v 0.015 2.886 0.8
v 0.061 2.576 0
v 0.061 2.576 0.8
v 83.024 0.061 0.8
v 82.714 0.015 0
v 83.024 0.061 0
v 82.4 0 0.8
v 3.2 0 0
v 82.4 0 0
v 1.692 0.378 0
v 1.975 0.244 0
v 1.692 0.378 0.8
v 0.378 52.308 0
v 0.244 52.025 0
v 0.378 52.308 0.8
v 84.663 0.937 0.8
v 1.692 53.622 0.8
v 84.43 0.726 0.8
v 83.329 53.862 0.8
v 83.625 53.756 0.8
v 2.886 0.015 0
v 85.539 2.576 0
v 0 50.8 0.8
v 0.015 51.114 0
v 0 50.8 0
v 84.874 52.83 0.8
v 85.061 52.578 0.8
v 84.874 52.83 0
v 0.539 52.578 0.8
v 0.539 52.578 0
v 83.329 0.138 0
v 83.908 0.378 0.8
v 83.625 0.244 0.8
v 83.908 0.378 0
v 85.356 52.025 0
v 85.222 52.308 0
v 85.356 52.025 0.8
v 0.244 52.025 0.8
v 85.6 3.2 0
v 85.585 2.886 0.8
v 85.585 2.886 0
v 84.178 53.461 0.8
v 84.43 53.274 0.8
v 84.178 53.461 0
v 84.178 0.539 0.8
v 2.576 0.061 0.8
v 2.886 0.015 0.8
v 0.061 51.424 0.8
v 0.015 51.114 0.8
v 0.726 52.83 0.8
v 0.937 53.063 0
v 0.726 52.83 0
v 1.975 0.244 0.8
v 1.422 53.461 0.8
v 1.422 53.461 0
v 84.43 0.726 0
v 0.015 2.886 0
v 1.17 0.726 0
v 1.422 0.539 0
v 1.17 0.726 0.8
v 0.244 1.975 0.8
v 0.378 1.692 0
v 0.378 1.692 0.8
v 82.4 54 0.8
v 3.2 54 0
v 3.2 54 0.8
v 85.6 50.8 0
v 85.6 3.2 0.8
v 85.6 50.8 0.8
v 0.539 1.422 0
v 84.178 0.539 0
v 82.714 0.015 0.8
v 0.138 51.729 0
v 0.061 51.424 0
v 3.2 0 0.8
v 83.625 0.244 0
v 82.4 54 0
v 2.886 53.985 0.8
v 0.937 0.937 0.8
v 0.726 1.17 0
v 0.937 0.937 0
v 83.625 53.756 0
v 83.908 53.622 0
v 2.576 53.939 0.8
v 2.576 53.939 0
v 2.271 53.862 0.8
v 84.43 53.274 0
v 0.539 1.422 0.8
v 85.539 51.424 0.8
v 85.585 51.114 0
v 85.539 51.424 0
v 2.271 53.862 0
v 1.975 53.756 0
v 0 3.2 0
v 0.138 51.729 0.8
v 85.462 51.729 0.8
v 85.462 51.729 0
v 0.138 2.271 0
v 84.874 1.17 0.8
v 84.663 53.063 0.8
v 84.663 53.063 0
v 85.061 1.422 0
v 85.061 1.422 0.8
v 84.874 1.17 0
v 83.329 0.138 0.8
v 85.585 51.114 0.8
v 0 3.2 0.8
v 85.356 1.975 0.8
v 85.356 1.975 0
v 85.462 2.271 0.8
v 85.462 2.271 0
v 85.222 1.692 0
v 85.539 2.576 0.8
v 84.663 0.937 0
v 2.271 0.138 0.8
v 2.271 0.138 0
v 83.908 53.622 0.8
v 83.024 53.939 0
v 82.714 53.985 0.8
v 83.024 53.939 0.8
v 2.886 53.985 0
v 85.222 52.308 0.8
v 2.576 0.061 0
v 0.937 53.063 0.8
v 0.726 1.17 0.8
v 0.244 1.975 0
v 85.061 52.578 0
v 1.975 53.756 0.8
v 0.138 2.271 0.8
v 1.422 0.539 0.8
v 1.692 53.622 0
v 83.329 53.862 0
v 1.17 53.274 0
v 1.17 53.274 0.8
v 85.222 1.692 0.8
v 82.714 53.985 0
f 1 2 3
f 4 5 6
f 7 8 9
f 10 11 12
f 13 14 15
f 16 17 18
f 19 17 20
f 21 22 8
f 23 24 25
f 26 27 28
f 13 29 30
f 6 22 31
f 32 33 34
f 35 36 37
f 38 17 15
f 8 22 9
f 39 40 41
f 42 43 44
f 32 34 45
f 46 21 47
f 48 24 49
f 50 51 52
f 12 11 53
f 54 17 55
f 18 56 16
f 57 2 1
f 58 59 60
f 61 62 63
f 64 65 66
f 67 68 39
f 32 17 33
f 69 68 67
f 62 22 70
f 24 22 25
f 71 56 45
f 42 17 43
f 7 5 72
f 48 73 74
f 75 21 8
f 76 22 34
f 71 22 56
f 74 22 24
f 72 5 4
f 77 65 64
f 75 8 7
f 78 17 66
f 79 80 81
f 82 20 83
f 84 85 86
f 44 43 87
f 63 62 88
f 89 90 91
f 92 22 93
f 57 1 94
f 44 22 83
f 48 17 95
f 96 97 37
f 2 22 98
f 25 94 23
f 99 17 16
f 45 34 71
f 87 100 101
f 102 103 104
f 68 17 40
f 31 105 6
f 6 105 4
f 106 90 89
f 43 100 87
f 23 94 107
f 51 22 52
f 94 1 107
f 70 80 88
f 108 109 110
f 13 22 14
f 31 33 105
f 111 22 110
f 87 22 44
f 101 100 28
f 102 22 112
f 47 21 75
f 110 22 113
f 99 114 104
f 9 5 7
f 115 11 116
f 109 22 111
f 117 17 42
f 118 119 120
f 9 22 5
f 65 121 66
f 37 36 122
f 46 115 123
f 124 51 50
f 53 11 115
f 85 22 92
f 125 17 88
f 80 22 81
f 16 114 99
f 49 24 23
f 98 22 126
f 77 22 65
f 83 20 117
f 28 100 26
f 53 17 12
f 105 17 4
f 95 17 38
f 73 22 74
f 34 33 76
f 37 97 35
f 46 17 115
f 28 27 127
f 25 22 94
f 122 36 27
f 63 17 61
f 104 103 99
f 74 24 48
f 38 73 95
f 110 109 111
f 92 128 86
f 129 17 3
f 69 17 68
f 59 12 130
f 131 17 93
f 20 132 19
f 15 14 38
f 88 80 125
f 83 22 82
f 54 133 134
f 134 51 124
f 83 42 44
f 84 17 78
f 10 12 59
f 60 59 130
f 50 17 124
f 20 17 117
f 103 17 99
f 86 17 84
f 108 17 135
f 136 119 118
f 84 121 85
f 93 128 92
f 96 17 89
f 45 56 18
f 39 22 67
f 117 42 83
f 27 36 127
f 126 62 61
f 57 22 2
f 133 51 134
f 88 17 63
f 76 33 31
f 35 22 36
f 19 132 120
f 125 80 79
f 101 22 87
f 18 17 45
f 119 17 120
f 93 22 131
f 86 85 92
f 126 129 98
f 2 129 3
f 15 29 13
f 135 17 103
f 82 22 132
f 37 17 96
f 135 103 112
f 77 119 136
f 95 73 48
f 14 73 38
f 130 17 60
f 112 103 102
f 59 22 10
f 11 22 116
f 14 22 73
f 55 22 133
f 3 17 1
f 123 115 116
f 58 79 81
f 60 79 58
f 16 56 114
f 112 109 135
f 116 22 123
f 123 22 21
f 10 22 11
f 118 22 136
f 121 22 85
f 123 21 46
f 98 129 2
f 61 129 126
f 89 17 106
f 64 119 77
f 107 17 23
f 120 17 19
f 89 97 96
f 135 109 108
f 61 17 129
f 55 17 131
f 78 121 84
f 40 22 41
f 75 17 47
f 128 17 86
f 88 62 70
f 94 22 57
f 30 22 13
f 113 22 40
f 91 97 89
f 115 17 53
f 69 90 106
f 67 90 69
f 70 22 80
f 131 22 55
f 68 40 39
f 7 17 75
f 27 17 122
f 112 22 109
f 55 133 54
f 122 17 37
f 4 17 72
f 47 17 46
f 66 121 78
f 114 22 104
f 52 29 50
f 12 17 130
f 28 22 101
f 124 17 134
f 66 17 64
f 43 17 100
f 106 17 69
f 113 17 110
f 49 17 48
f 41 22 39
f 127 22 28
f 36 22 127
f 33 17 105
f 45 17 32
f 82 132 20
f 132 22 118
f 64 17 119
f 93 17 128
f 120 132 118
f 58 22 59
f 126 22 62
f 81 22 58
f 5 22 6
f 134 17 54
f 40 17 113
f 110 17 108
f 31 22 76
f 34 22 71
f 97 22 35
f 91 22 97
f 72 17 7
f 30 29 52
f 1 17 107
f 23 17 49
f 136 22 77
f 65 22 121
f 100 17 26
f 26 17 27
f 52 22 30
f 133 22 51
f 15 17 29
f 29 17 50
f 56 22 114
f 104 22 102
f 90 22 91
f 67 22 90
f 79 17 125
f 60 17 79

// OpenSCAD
// ═══════════════════════════════════════════════════════════════════
// ZaZet Solutions — 3D Printed Business Card  v3
// ═══════════════════════════════════════════════════════════════════
//
//  Standard ISO 7810 ID-1: 85.6 × 54 mm  |  Total: 1.6 mm thick
//
//  THREE COLORS — AMS / multi-material:
//    COLOR 1  Navy blue  — card base  (z 0 → 0.8 mm)
//    COLOR 2  Gold       — all raised text + logo bottom 70% + QR code
//    COLOR 3  Blue       — logo "ZaZet" top 30%
//
//  QR code links to: https://zazet-solutions.hr
//  Bottom-right corner, 18×18 mm (25×25 modules @ 0.72 mm each)
// ═══════════════════════════════════════════════════════════════════

COLOR = 1; // ← 1=navy  2=gold  3=blue

CARD_W = 85.6;
CARD_H = 54.0;
T      = 0.8;
CR     = 3.2;
e      = 0.01;

FB  = "Liberation Sans:style=Bold";
FR  = "Liberation Sans:style=Regular";
FI  = "Liberation Sans:style=Italic";

NAME    = "Gal Tidhar";
TITLE1  = "Software Engineer";
TITLE2  = "& Builder";
TAGLINE = "Less chaos. More business.";
PHONE   = "+385 99 190 4995";
EMAIL   = "gal@zazet-solutions.hr";
WEB     = "zazet-solutions.hr";
LI      = "linkedin.com/in/galtidhar";

LX      = 6.5;
LY      = 33.5;
LSIZE   = 11;
LCAP    = LSIZE * 0.72;
LSPLIT  = LY + LCAP * 0.70;   // ≈ 39.1 — y where gold ends / blue starts

// QR code position (bottom-right)
QR_X    = 59.0;   // left edge of QR
QR_Y    = 4.5;    // bottom edge of QR
QR_H    = T;      // same height as all raised elements

// ─────────────────────────────────────────────────────────────────
module card_outline(h) {
    hull()
        for (x = [CR, CARD_W-CR], y = [CR, CARD_H-CR])
            translate([x, y, 0])
                cylinder(r=CR, h=h, $fn=64);
}

module zazet_gold() {
    intersection() {
        translate([LX, LY, 0])
            linear_extrude(T + e)
                text("ZaZet", size=LSIZE, font=FB,
                     halign="left", valign="bottom");
        cube([CARD_W, LSPLIT, T + 2*e]);
    }
}

module zazet_blue() {
    intersection() {
        translate([LX, LY, 0])
            linear_extrude(T + e)
                text("ZaZet", size=LSIZE, font=FB,
                     halign="left", valign="bottom");
        translate([0, LSPLIT, -e])
            cube([CARD_W, CARD_H, T + 2*e]);
    }
}

module gold_text() {
    // "SOLUTIONS" subtitle
    translate([LX, 28.2, 0])
        linear_extrude(T * 0.7)
            text("SOLUTIONS", size=3.0, font=FB, spacing=1.35,
                 halign="left", valign="bottom");

    // Vertical rule — logo | name
    translate([43.5, 26.5, 0]) cube([0.55, 23.5, T * 0.65]);

    // Name
    translate([46.5, 44.0, 0])
        linear_extrude(T)
            text(NAME, size=5.0, font=FB, halign="left", valign="center");

    // Title
    translate([46.5, 38.0, 0])
        linear_extrude(T)
            text(TITLE1, size=2.5, font=FR, halign="left", valign="center");
    translate([46.5, 34.5, 0])
        linear_extrude(T)
            text(TITLE2, size=2.5, font=FR, halign="left", valign="center");

    // Main horizontal rule
    translate([6.5, 25.5, 0]) cube([CARD_W - 13, 0.5, T * 0.55]);

    // Tagline — left-aligned below rule, italic
    translate([6.5, 21.5, 0])
        linear_extrude(T * 0.75)
            text(TAGLINE, size=2.8, font=FI, halign="left", valign="center");

    // Thin rule between tagline and contact
    translate([6.5, 18.2, 0]) cube([47.5, 0.32, T * 0.45]);

    // Contact info (left column, 4 lines)
    translate([6.5, 15.5, 0]) linear_extrude(T * 0.7)
        text(PHONE, size=2.2, font=FR, halign="left", valign="center");
    translate([6.5, 11.5, 0]) linear_extrude(T * 0.7)
        text(EMAIL, size=2.2, font=FR, halign="left", valign="center");
    translate([6.5,  7.5, 0]) linear_extrude(T * 0.7)
        text(WEB,   size=2.2, font=FR, halign="left", valign="center");
    translate([6.5,  3.5, 0]) linear_extrude(T * 0.7)
        text(LI,    size=2.2, font=FR, halign="left", valign="center");

    // Vertical rule — contact | QR
    translate([56.0, 4.0, 0]) cube([0.45, 21.0, T * 0.55]);

    // QR code — bottom right corner
    qr_code(QR_X, QR_Y, QR_H);
}

// ─────────────────────────────────────────────────────────────────
// Auto-generated QR code — https://zazet-solutions.hr
// Version 2, 25×25 modules, 0.72mm per module
module qr_code(x0, y0, h, e=0.01) {
  translate([x0, y0, 0]) {
  translate([0.0000,17.2800,0]) cube([0.72,0.72,h+e]);
  translate([0.7200,17.2800,0]) cube([0.72,0.72,h+e]);
  translate([1.4400,17.2800,0]) cube([0.72,0.72,h+e]);
  translate([2.1600,17.2800,0]) cube([0.72,0.72,h+e]);
  translate([2.8800,17.2800,0]) cube([0.72,0.72,h+e]);
  translate([3.6000,17.2800,0]) cube([0.72,0.72,h+e]);
  translate([4.3200,17.2800,0]) cube([0.72,0.72,h+e]);
  translate([5.7600,17.2800,0]) cube([0.72,0.72,h+e]);
  translate([6.4800,17.2800,0]) cube([0.72,0.72,h+e]);
  translate([7.2000,17.2800,0]) cube([0.72,0.72,h+e]);
  translate([7.9200,17.2800,0]) cube([0.72,0.72,h+e]);
  translate([9.3600,17.2800,0]) cube([0.72,0.72,h+e]);
  translate([12.9600,17.2800,0]) cube([0.72,0.72,h+e]);
  translate([13.6800,17.2800,0]) cube([0.72,0.72,h+e]);
  translate([14.4000,17.2800,0]) cube([0.72,0.72,h+e]);
  translate([15.1200,17.2800,0]) cube([0.72,0.72,h+e]);
  translate([15.8400,17.2800,0]) cube([0.72,0.72,h+e]);
  translate([16.5600,17.2800,0]) cube([0.72,0.72,h+e]);
  translate([17.2800,17.2800,0]) cube([0.72,0.72,h+e]);
  translate([0.0000,16.5600,0]) cube([0.72,0.72,h+e]);
  translate([4.3200,16.5600,0]) cube([0.72,0.72,h+e]);
  translate([5.7600,16.5600,0]) cube([0.72,0.72,h+e]);
  translate([6.4800,16.5600,0]) cube([0.72,0.72,h+e]);
  translate([8.6400,16.5600,0]) cube([0.72,0.72,h+e]);
  translate([9.3600,16.5600,0]) cube([0.72,0.72,h+e]);
  translate([12.9600,16.5600,0]) cube([0.72,0.72,h+e]);
  translate([17.2800,16.5600,0]) cube([0.72,0.72,h+e]);
  translate([0.0000,15.8400,0]) cube([0.72,0.72,h+e]);
  translate([1.4400,15.8400,0]) cube([0.72,0.72,h+e]);
  translate([2.1600,15.8400,0]) cube([0.72,0.72,h+e]);
  translate([2.8800,15.8400,0]) cube([0.72,0.72,h+e]);
  translate([4.3200,15.8400,0]) cube([0.72,0.72,h+e]);
  translate([5.7600,15.8400,0]) cube([0.72,0.72,h+e]);
  translate([7.2000,15.8400,0]) cube([0.72,0.72,h+e]);
  translate([7.9200,15.8400,0]) cube([0.72,0.72,h+e]);
  translate([9.3600,15.8400,0]) cube([0.72,0.72,h+e]);
  translate([10.0800,15.8400,0]) cube([0.72,0.72,h+e]);
  translate([10.8000,15.8400,0]) cube([0.72,0.72,h+e]);
  translate([12.9600,15.8400,0]) cube([0.72,0.72,h+e]);
  translate([14.4000,15.8400,0]) cube([0.72,0.72,h+e]);
  translate([15.1200,15.8400,0]) cube([0.72,0.72,h+e]);
  translate([15.8400,15.8400,0]) cube([0.72,0.72,h+e]);
  translate([17.2800,15.8400,0]) cube([0.72,0.72,h+e]);
  translate([0.0000,15.1200,0]) cube([0.72,0.72,h+e]);
  translate([1.4400,15.1200,0]) cube([0.72,0.72,h+e]);
  translate([2.1600,15.1200,0]) cube([0.72,0.72,h+e]);
  translate([2.8800,15.1200,0]) cube([0.72,0.72,h+e]);
  translate([4.3200,15.1200,0]) cube([0.72,0.72,h+e]);
  translate([6.4800,15.1200,0]) cube([0.72,0.72,h+e]);
  translate([9.3600,15.1200,0]) cube([0.72,0.72,h+e]);
  translate([10.8000,15.1200,0]) cube([0.72,0.72,h+e]);
  translate([11.5200,15.1200,0]) cube([0.72,0.72,h+e]);
  translate([12.9600,15.1200,0]) cube([0.72,0.72,h+e]);
  translate([14.4000,15.1200,0]) cube([0.72,0.72,h+e]);
  translate([15.1200,15.1200,0]) cube([0.72,0.72,h+e]);
  translate([15.8400,15.1200,0]) cube([0.72,0.72,h+e]);
  translate([17.2800,15.1200,0]) cube([0.72,0.72,h+e]);
  translate([0.0000,14.4000,0]) cube([0.72,0.72,h+e]);
  translate([1.4400,14.4000,0]) cube([0.72,0.72,h+e]);
  translate([2.1600,14.4000,0]) cube([0.72,0.72,h+e]);
  translate([2.8800,14.4000,0]) cube([0.72,0.72,h+e]);
  translate([4.3200,14.4000,0]) cube([0.72,0.72,h+e]);
  translate([5.7600,14.4000,0]) cube([0.72,0.72,h+e]);
  translate([8.6400,14.4000,0]) cube([0.72,0.72,h+e]);
  translate([11.5200,14.4000,0]) cube([0.72,0.72,h+e]);
  translate([12.9600,14.4000,0]) cube([0.72,0.72,h+e]);
  translate([14.4000,14.4000,0]) cube([0.72,0.72,h+e]);
  translate([15.1200,14.4000,0]) cube([0.72,0.72,h+e]);
  translate([15.8400,14.4000,0]) cube([0.72,0.72,h+e]);
  translate([17.2800,14.4000,0]) cube([0.72,0.72,h+e]);
  translate([0.0000,13.6800,0]) cube([0.72,0.72,h+e]);
  translate([4.3200,13.6800,0]) cube([0.72,0.72,h+e]);
  translate([7.9200,13.6800,0]) cube([0.72,0.72,h+e]);
  translate([8.6400,13.6800,0]) cube([0.72,0.72,h+e]);
  translate([10.0800,13.6800,0]) cube([0.72,0.72,h+e]);
  translate([12.9600,13.6800,0]) cube([0.72,0.72,h+e]);
  translate([17.2800,13.6800,0]) cube([0.72,0.72,h+e]);
  translate([0.0000,12.9600,0]) cube([0.72,0.72,h+e]);
  translate([0.7200,12.9600,0]) cube([0.72,0.72,h+e]);
  translate([1.4400,12.9600,0]) cube([0.72,0.72,h+e]);
  translate([2.1600,12.9600,0]) cube([0.72,0.72,h+e]);
  translate([2.8800,12.9600,0]) cube([0.72,0.72,h+e]);
  translate([3.6000,12.9600,0]) cube([0.72,0.72,h+e]);
  translate([4.3200,12.9600,0]) cube([0.72,0.72,h+e]);
  translate([5.7600,12.9600,0]) cube([0.72,0.72,h+e]);
  translate([7.2000,12.9600,0]) cube([0.72,0.72,h+e]);
  translate([8.6400,12.9600,0]) cube([0.72,0.72,h+e]);
  translate([10.0800,12.9600,0]) cube([0.72,0.72,h+e]);
  translate([11.5200,12.9600,0]) cube([0.72,0.72,h+e]);
  translate([12.9600,12.9600,0]) cube([0.72,0.72,h+e]);
  translate([13.6800,12.9600,0]) cube([0.72,0.72,h+e]);
  translate([14.4000,12.9600,0]) cube([0.72,0.72,h+e]);
  translate([15.1200,12.9600,0]) cube([0.72,0.72,h+e]);
  translate([15.8400,12.9600,0]) cube([0.72,0.72,h+e]);
  translate([16.5600,12.9600,0]) cube([0.72,0.72,h+e]);
  translate([17.2800,12.9600,0]) cube([0.72,0.72,h+e]);
  translate([7.2000,12.2400,0]) cube([0.72,0.72,h+e]);
  translate([7.9200,12.2400,0]) cube([0.72,0.72,h+e]);
  translate([9.3600,12.2400,0]) cube([0.72,0.72,h+e]);
  translate([10.0800,12.2400,0]) cube([0.72,0.72,h+e]);
  translate([10.8000,12.2400,0]) cube([0.72,0.72,h+e]);
  translate([11.5200,12.2400,0]) cube([0.72,0.72,h+e]);
  translate([0.0000,11.5200,0]) cube([0.72,0.72,h+e]);
  translate([2.1600,11.5200,0]) cube([0.72,0.72,h+e]);
  translate([2.8800,11.5200,0]) cube([0.72,0.72,h+e]);
  translate([3.6000,11.5200,0]) cube([0.72,0.72,h+e]);
  translate([4.3200,11.5200,0]) cube([0.72,0.72,h+e]);
  translate([5.0400,11.5200,0]) cube([0.72,0.72,h+e]);
  translate([5.7600,11.5200,0]) cube([0.72,0.72,h+e]);
  translate([6.4800,11.5200,0]) cube([0.72,0.72,h+e]);
  translate([7.2000,11.5200,0]) cube([0.72,0.72,h+e]);
  translate([10.0800,11.5200,0]) cube([0.72,0.72,h+e]);
  translate([11.5200,11.5200,0]) cube([0.72,0.72,h+e]);
  translate([12.2400,11.5200,0]) cube([0.72,0.72,h+e]);
  translate([14.4000,11.5200,0]) cube([0.72,0.72,h+e]);
  translate([15.8400,11.5200,0]) cube([0.72,0.72,h+e]);
  translate([16.5600,11.5200,0]) cube([0.72,0.72,h+e]);
  translate([17.2800,11.5200,0]) cube([0.72,0.72,h+e]);
  translate([0.0000,10.8000,0]) cube([0.72,0.72,h+e]);
  translate([1.4400,10.8000,0]) cube([0.72,0.72,h+e]);
  translate([5.0400,10.8000,0]) cube([0.72,0.72,h+e]);
  translate([5.7600,10.8000,0]) cube([0.72,0.72,h+e]);
  translate([7.2000,10.8000,0]) cube([0.72,0.72,h+e]);
  translate([8.6400,10.8000,0]) cube([0.72,0.72,h+e]);
  translate([9.3600,10.8000,0]) cube([0.72,0.72,h+e]);
  translate([10.0800,10.8000,0]) cube([0.72,0.72,h+e]);
  translate([10.8000,10.8000,0]) cube([0.72,0.72,h+e]);
  translate([13.6800,10.8000,0]) cube([0.72,0.72,h+e]);
  translate([14.4000,10.8000,0]) cube([0.72,0.72,h+e]);
  translate([15.1200,10.8000,0]) cube([0.72,0.72,h+e]);
  translate([15.8400,10.8000,0]) cube([0.72,0.72,h+e]);
  translate([16.5600,10.8000,0]) cube([0.72,0.72,h+e]);
  translate([0.7200,10.0800,0]) cube([0.72,0.72,h+e]);
  translate([1.4400,10.0800,0]) cube([0.72,0.72,h+e]);
  translate([2.8800,10.0800,0]) cube([0.72,0.72,h+e]);
  translate([3.6000,10.0800,0]) cube([0.72,0.72,h+e]);
  translate([4.3200,10.0800,0]) cube([0.72,0.72,h+e]);
  translate([5.0400,10.0800,0]) cube([0.72,0.72,h+e]);
  translate([5.7600,10.0800,0]) cube([0.72,0.72,h+e]);
  translate([6.4800,10.0800,0]) cube([0.72,0.72,h+e]);
  translate([7.2000,10.0800,0]) cube([0.72,0.72,h+e]);
  translate([7.9200,10.0800,0]) cube([0.72,0.72,h+e]);
  translate([8.6400,10.0800,0]) cube([0.72,0.72,h+e]);
  translate([10.0800,10.0800,0]) cube([0.72,0.72,h+e]);
  translate([10.8000,10.0800,0]) cube([0.72,0.72,h+e]);
  translate([11.5200,10.0800,0]) cube([0.72,0.72,h+e]);
  translate([12.2400,10.0800,0]) cube([0.72,0.72,h+e]);
  translate([12.9600,10.0800,0]) cube([0.72,0.72,h+e]);
  translate([15.1200,10.0800,0]) cube([0.72,0.72,h+e]);
  translate([17.2800,10.0800,0]) cube([0.72,0.72,h+e]);
  translate([3.6000,9.3600,0]) cube([0.72,0.72,h+e]);
  translate([5.0400,9.3600,0]) cube([0.72,0.72,h+e]);
  translate([5.7600,9.3600,0]) cube([0.72,0.72,h+e]);
  translate([6.4800,9.3600,0]) cube([0.72,0.72,h+e]);
  translate([8.6400,9.3600,0]) cube([0.72,0.72,h+e]);
  translate([10.0800,9.3600,0]) cube([0.72,0.72,h+e]);
  translate([10.8000,9.3600,0]) cube([0.72,0.72,h+e]);
  translate([11.5200,9.3600,0]) cube([0.72,0.72,h+e]);
  translate([12.9600,9.3600,0]) cube([0.72,0.72,h+e]);
  translate([14.4000,9.3600,0]) cube([0.72,0.72,h+e]);
  translate([15.1200,9.3600,0]) cube([0.72,0.72,h+e]);
  translate([15.8400,9.3600,0]) cube([0.72,0.72,h+e]);
  translate([16.5600,9.3600,0]) cube([0.72,0.72,h+e]);
  translate([17.2800,9.3600,0]) cube([0.72,0.72,h+e]);
  translate([2.8800,8.6400,0]) cube([0.72,0.72,h+e]);
  translate([3.6000,8.6400,0]) cube([0.72,0.72,h+e]);
  translate([4.3200,8.6400,0]) cube([0.72,0.72,h+e]);
  translate([5.0400,8.6400,0]) cube([0.72,0.72,h+e]);
  translate([7.2000,8.6400,0]) cube([0.72,0.72,h+e]);
  translate([7.9200,8.6400,0]) cube([0.72,0.72,h+e]);
  translate([8.6400,8.6400,0]) cube([0.72,0.72,h+e]);
  translate([10.8000,8.6400,0]) cube([0.72,0.72,h+e]);
  translate([12.9600,8.6400,0]) cube([0.72,0.72,h+e]);
  translate([17.2800,8.6400,0]) cube([0.72,0.72,h+e]);
  translate([0.0000,7.9200,0]) cube([0.72,0.72,h+e]);
  translate([1.4400,7.9200,0]) cube([0.72,0.72,h+e]);
  translate([2.8800,7.9200,0]) cube([0.72,0.72,h+e]);
  translate([3.6000,7.9200,0]) cube([0.72,0.72,h+e]);
  translate([8.6400,7.9200,0]) cube([0.72,0.72,h+e]);
  translate([10.0800,7.9200,0]) cube([0.72,0.72,h+e]);
  translate([10.8000,7.9200,0]) cube([0.72,0.72,h+e]);
  translate([11.5200,7.9200,0]) cube([0.72,0.72,h+e]);
  translate([12.2400,7.9200,0]) cube([0.72,0.72,h+e]);
  translate([14.4000,7.9200,0]) cube([0.72,0.72,h+e]);
  translate([16.5600,7.9200,0]) cube([0.72,0.72,h+e]);
  translate([0.0000,7.2000,0]) cube([0.72,0.72,h+e]);
  translate([0.7200,7.2000,0]) cube([0.72,0.72,h+e]);
  translate([4.3200,7.2000,0]) cube([0.72,0.72,h+e]);
  translate([5.7600,7.2000,0]) cube([0.72,0.72,h+e]);
  translate([8.6400,7.2000,0]) cube([0.72,0.72,h+e]);
  translate([10.0800,7.2000,0]) cube([0.72,0.72,h+e]);
  translate([10.8000,7.2000,0]) cube([0.72,0.72,h+e]);
  translate([14.4000,7.2000,0]) cube([0.72,0.72,h+e]);
  translate([15.1200,7.2000,0]) cube([0.72,0.72,h+e]);
  translate([15.8400,7.2000,0]) cube([0.72,0.72,h+e]);
  translate([16.5600,7.2000,0]) cube([0.72,0.72,h+e]);
  translate([17.2800,7.2000,0]) cube([0.72,0.72,h+e]);
  translate([0.0000,6.4800,0]) cube([0.72,0.72,h+e]);
  translate([1.4400,6.4800,0]) cube([0.72,0.72,h+e]);
  translate([2.1600,6.4800,0]) cube([0.72,0.72,h+e]);
  translate([3.6000,6.4800,0]) cube([0.72,0.72,h+e]);
  translate([5.0400,6.4800,0]) cube([0.72,0.72,h+e]);
  translate([6.4800,6.4800,0]) cube([0.72,0.72,h+e]);
  translate([7.2000,6.4800,0]) cube([0.72,0.72,h+e]);
  translate([7.9200,6.4800,0]) cube([0.72,0.72,h+e]);
  translate([8.6400,6.4800,0]) cube([0.72,0.72,h+e]);
  translate([13.6800,6.4800,0]) cube([0.72,0.72,h+e]);
  translate([15.1200,6.4800,0]) cube([0.72,0.72,h+e]);
  translate([15.8400,6.4800,0]) cube([0.72,0.72,h+e]);
  translate([17.2800,6.4800,0]) cube([0.72,0.72,h+e]);
  translate([0.0000,5.7600,0]) cube([0.72,0.72,h+e]);
  translate([1.4400,5.7600,0]) cube([0.72,0.72,h+e]);
  translate([2.1600,5.7600,0]) cube([0.72,0.72,h+e]);
  translate([2.8800,5.7600,0]) cube([0.72,0.72,h+e]);
  translate([4.3200,5.7600,0]) cube([0.72,0.72,h+e]);
  translate([5.7600,5.7600,0]) cube([0.72,0.72,h+e]);
  translate([7.2000,5.7600,0]) cube([0.72,0.72,h+e]);
  translate([7.9200,5.7600,0]) cube([0.72,0.72,h+e]);
  translate([9.3600,5.7600,0]) cube([0.72,0.72,h+e]);
  translate([11.5200,5.7600,0]) cube([0.72,0.72,h+e]);
  translate([12.2400,5.7600,0]) cube([0.72,0.72,h+e]);
  translate([12.9600,5.7600,0]) cube([0.72,0.72,h+e]);
  translate([13.6800,5.7600,0]) cube([0.72,0.72,h+e]);
  translate([14.4000,5.7600,0]) cube([0.72,0.72,h+e]);
  translate([15.8400,5.7600,0]) cube([0.72,0.72,h+e]);
  translate([16.5600,5.7600,0]) cube([0.72,0.72,h+e]);
  translate([5.7600,5.0400,0]) cube([0.72,0.72,h+e]);
  translate([7.2000,5.0400,0]) cube([0.72,0.72,h+e]);
  translate([9.3600,5.0400,0]) cube([0.72,0.72,h+e]);
  translate([11.5200,5.0400,0]) cube([0.72,0.72,h+e]);
  translate([14.4000,5.0400,0]) cube([0.72,0.72,h+e]);
  translate([15.8400,5.0400,0]) cube([0.72,0.72,h+e]);
  translate([16.5600,5.0400,0]) cube([0.72,0.72,h+e]);
  translate([0.0000,4.3200,0]) cube([0.72,0.72,h+e]);
  translate([0.7200,4.3200,0]) cube([0.72,0.72,h+e]);
  translate([1.4400,4.3200,0]) cube([0.72,0.72,h+e]);
  translate([2.1600,4.3200,0]) cube([0.72,0.72,h+e]);
  translate([2.8800,4.3200,0]) cube([0.72,0.72,h+e]);
  translate([3.6000,4.3200,0]) cube([0.72,0.72,h+e]);
  translate([4.3200,4.3200,0]) cube([0.72,0.72,h+e]);
  translate([5.7600,4.3200,0]) cube([0.72,0.72,h+e]);
  translate([7.9200,4.3200,0]) cube([0.72,0.72,h+e]);
  translate([8.6400,4.3200,0]) cube([0.72,0.72,h+e]);
  translate([11.5200,4.3200,0]) cube([0.72,0.72,h+e]);
  translate([12.9600,4.3200,0]) cube([0.72,0.72,h+e]);
  translate([14.4000,4.3200,0]) cube([0.72,0.72,h+e]);
  translate([17.2800,4.3200,0]) cube([0.72,0.72,h+e]);
  translate([0.0000,3.6000,0]) cube([0.72,0.72,h+e]);
  translate([4.3200,3.6000,0]) cube([0.72,0.72,h+e]);
  translate([5.7600,3.6000,0]) cube([0.72,0.72,h+e]);
  translate([6.4800,3.6000,0]) cube([0.72,0.72,h+e]);
  translate([7.2000,3.6000,0]) cube([0.72,0.72,h+e]);
  translate([8.6400,3.6000,0]) cube([0.72,0.72,h+e]);
  translate([9.3600,3.6000,0]) cube([0.72,0.72,h+e]);
  translate([10.0800,3.6000,0]) cube([0.72,0.72,h+e]);
  translate([11.5200,3.6000,0]) cube([0.72,0.72,h+e]);
  translate([14.4000,3.6000,0]) cube([0.72,0.72,h+e]);
  translate([0.0000,2.8800,0]) cube([0.72,0.72,h+e]);
  translate([1.4400,2.8800,0]) cube([0.72,0.72,h+e]);
  translate([2.1600,2.8800,0]) cube([0.72,0.72,h+e]);
  translate([2.8800,2.8800,0]) cube([0.72,0.72,h+e]);
  translate([4.3200,2.8800,0]) cube([0.72,0.72,h+e]);
  translate([5.7600,2.8800,0]) cube([0.72,0.72,h+e]);
  translate([7.2000,2.8800,0]) cube([0.72,0.72,h+e]);
  translate([7.9200,2.8800,0]) cube([0.72,0.72,h+e]);
  translate([8.6400,2.8800,0]) cube([0.72,0.72,h+e]);
  translate([10.0800,2.8800,0]) cube([0.72,0.72,h+e]);
  translate([10.8000,2.8800,0]) cube([0.72,0.72,h+e]);
  translate([11.5200,2.8800,0]) cube([0.72,0.72,h+e]);
  translate([12.2400,2.8800,0]) cube([0.72,0.72,h+e]);
  translate([12.9600,2.8800,0]) cube([0.72,0.72,h+e]);
  translate([13.6800,2.8800,0]) cube([0.72,0.72,h+e]);
  translate([14.4000,2.8800,0]) cube([0.72,0.72,h+e]);
  translate([0.0000,2.1600,0]) cube([0.72,0.72,h+e]);
  translate([1.4400,2.1600,0]) cube([0.72,0.72,h+e]);
  translate([2.1600,2.1600,0]) cube([0.72,0.72,h+e]);
  translate([2.8800,2.1600,0]) cube([0.72,0.72,h+e]);
  translate([4.3200,2.1600,0]) cube([0.72,0.72,h+e]);
  translate([5.7600,2.1600,0]) cube([0.72,0.72,h+e]);
  translate([6.4800,2.1600,0]) cube([0.72,0.72,h+e]);
  translate([7.2000,2.1600,0]) cube([0.72,0.72,h+e]);
  translate([7.9200,2.1600,0]) cube([0.72,0.72,h+e]);
  translate([11.5200,2.1600,0]) cube([0.72,0.72,h+e]);
  translate([12.2400,2.1600,0]) cube([0.72,0.72,h+e]);
  translate([12.9600,2.1600,0]) cube([0.72,0.72,h+e]);
  translate([16.5600,2.1600,0]) cube([0.72,0.72,h+e]);
  translate([17.2800,2.1600,0]) cube([0.72,0.72,h+e]);
  translate([0.0000,1.4400,0]) cube([0.72,0.72,h+e]);
  translate([1.4400,1.4400,0]) cube([0.72,0.72,h+e]);
  translate([2.1600,1.4400,0]) cube([0.72,0.72,h+e]);
  translate([2.8800,1.4400,0]) cube([0.72,0.72,h+e]);
  translate([4.3200,1.4400,0]) cube([0.72,0.72,h+e]);
  translate([7.2000,1.4400,0]) cube([0.72,0.72,h+e]);
  translate([7.9200,1.4400,0]) cube([0.72,0.72,h+e]);
  translate([8.6400,1.4400,0]) cube([0.72,0.72,h+e]);
  translate([9.3600,1.4400,0]) cube([0.72,0.72,h+e]);
  translate([10.0800,1.4400,0]) cube([0.72,0.72,h+e]);
  translate([12.2400,1.4400,0]) cube([0.72,0.72,h+e]);
  translate([14.4000,1.4400,0]) cube([0.72,0.72,h+e]);
  translate([15.1200,1.4400,0]) cube([0.72,0.72,h+e]);
  translate([15.8400,1.4400,0]) cube([0.72,0.72,h+e]);
  translate([16.5600,1.4400,0]) cube([0.72,0.72,h+e]);
  translate([17.2800,1.4400,0]) cube([0.72,0.72,h+e]);
  translate([0.0000,0.7200,0]) cube([0.72,0.72,h+e]);
  translate([4.3200,0.7200,0]) cube([0.72,0.72,h+e]);
  translate([6.4800,0.7200,0]) cube([0.72,0.72,h+e]);
  translate([10.0800,0.7200,0]) cube([0.72,0.72,h+e]);
  translate([10.8000,0.7200,0]) cube([0.72,0.72,h+e]);
  translate([12.9600,0.7200,0]) cube([0.72,0.72,h+e]);
  translate([13.6800,0.7200,0]) cube([0.72,0.72,h+e]);
  translate([14.4000,0.7200,0]) cube([0.72,0.72,h+e]);
  translate([15.8400,0.7200,0]) cube([0.72,0.72,h+e]);
  translate([16.5600,0.7200,0]) cube([0.72,0.72,h+e]);
  translate([17.2800,0.7200,0]) cube([0.72,0.72,h+e]);
  translate([0.0000,0.0000,0]) cube([0.72,0.72,h+e]);
  translate([0.7200,0.0000,0]) cube([0.72,0.72,h+e]);
  translate([1.4400,0.0000,0]) cube([0.72,0.72,h+e]);
  translate([2.1600,0.0000,0]) cube([0.72,0.72,h+e]);
  translate([2.8800,0.0000,0]) cube([0.72,0.72,h+e]);
  translate([3.6000,0.0000,0]) cube([0.72,0.72,h+e]);
  translate([4.3200,0.0000,0]) cube([0.72,0.72,h+e]);
  translate([5.7600,0.0000,0]) cube([0.72,0.72,h+e]);
  translate([8.6400,0.0000,0]) cube([0.72,0.72,h+e]);
  translate([10.0800,0.0000,0]) cube([0.72,0.72,h+e]);
  translate([11.5200,0.0000,0]) cube([0.72,0.72,h+e]);
  translate([12.9600,0.0000,0]) cube([0.72,0.72,h+e]);
  translate([15.1200,0.0000,0]) cube([0.72,0.72,h+e]);
  translate([17.2800,0.0000,0]) cube([0.72,0.72,h+e]);
  }
}

// ─────────────────────────────────────────────────────────────────
// ASSEMBLY
// ─────────────────────────────────────────────────────────────────

if (COLOR == 1) {
    card_outline(T);
}
if (COLOR == 2) {
    translate([0, 0, T])
        intersection() {
            union() {
                zazet_gold();
                gold_text();
            }
            translate([0, 0, -e]) card_outline(T + 2*e);
        }
}
if (COLOR == 3) {
    translate([0, 0, T])
        intersection() {
            zazet_blue();
            translate([0, 0, -e]) card_outline(T + 2*e);
        }
}
